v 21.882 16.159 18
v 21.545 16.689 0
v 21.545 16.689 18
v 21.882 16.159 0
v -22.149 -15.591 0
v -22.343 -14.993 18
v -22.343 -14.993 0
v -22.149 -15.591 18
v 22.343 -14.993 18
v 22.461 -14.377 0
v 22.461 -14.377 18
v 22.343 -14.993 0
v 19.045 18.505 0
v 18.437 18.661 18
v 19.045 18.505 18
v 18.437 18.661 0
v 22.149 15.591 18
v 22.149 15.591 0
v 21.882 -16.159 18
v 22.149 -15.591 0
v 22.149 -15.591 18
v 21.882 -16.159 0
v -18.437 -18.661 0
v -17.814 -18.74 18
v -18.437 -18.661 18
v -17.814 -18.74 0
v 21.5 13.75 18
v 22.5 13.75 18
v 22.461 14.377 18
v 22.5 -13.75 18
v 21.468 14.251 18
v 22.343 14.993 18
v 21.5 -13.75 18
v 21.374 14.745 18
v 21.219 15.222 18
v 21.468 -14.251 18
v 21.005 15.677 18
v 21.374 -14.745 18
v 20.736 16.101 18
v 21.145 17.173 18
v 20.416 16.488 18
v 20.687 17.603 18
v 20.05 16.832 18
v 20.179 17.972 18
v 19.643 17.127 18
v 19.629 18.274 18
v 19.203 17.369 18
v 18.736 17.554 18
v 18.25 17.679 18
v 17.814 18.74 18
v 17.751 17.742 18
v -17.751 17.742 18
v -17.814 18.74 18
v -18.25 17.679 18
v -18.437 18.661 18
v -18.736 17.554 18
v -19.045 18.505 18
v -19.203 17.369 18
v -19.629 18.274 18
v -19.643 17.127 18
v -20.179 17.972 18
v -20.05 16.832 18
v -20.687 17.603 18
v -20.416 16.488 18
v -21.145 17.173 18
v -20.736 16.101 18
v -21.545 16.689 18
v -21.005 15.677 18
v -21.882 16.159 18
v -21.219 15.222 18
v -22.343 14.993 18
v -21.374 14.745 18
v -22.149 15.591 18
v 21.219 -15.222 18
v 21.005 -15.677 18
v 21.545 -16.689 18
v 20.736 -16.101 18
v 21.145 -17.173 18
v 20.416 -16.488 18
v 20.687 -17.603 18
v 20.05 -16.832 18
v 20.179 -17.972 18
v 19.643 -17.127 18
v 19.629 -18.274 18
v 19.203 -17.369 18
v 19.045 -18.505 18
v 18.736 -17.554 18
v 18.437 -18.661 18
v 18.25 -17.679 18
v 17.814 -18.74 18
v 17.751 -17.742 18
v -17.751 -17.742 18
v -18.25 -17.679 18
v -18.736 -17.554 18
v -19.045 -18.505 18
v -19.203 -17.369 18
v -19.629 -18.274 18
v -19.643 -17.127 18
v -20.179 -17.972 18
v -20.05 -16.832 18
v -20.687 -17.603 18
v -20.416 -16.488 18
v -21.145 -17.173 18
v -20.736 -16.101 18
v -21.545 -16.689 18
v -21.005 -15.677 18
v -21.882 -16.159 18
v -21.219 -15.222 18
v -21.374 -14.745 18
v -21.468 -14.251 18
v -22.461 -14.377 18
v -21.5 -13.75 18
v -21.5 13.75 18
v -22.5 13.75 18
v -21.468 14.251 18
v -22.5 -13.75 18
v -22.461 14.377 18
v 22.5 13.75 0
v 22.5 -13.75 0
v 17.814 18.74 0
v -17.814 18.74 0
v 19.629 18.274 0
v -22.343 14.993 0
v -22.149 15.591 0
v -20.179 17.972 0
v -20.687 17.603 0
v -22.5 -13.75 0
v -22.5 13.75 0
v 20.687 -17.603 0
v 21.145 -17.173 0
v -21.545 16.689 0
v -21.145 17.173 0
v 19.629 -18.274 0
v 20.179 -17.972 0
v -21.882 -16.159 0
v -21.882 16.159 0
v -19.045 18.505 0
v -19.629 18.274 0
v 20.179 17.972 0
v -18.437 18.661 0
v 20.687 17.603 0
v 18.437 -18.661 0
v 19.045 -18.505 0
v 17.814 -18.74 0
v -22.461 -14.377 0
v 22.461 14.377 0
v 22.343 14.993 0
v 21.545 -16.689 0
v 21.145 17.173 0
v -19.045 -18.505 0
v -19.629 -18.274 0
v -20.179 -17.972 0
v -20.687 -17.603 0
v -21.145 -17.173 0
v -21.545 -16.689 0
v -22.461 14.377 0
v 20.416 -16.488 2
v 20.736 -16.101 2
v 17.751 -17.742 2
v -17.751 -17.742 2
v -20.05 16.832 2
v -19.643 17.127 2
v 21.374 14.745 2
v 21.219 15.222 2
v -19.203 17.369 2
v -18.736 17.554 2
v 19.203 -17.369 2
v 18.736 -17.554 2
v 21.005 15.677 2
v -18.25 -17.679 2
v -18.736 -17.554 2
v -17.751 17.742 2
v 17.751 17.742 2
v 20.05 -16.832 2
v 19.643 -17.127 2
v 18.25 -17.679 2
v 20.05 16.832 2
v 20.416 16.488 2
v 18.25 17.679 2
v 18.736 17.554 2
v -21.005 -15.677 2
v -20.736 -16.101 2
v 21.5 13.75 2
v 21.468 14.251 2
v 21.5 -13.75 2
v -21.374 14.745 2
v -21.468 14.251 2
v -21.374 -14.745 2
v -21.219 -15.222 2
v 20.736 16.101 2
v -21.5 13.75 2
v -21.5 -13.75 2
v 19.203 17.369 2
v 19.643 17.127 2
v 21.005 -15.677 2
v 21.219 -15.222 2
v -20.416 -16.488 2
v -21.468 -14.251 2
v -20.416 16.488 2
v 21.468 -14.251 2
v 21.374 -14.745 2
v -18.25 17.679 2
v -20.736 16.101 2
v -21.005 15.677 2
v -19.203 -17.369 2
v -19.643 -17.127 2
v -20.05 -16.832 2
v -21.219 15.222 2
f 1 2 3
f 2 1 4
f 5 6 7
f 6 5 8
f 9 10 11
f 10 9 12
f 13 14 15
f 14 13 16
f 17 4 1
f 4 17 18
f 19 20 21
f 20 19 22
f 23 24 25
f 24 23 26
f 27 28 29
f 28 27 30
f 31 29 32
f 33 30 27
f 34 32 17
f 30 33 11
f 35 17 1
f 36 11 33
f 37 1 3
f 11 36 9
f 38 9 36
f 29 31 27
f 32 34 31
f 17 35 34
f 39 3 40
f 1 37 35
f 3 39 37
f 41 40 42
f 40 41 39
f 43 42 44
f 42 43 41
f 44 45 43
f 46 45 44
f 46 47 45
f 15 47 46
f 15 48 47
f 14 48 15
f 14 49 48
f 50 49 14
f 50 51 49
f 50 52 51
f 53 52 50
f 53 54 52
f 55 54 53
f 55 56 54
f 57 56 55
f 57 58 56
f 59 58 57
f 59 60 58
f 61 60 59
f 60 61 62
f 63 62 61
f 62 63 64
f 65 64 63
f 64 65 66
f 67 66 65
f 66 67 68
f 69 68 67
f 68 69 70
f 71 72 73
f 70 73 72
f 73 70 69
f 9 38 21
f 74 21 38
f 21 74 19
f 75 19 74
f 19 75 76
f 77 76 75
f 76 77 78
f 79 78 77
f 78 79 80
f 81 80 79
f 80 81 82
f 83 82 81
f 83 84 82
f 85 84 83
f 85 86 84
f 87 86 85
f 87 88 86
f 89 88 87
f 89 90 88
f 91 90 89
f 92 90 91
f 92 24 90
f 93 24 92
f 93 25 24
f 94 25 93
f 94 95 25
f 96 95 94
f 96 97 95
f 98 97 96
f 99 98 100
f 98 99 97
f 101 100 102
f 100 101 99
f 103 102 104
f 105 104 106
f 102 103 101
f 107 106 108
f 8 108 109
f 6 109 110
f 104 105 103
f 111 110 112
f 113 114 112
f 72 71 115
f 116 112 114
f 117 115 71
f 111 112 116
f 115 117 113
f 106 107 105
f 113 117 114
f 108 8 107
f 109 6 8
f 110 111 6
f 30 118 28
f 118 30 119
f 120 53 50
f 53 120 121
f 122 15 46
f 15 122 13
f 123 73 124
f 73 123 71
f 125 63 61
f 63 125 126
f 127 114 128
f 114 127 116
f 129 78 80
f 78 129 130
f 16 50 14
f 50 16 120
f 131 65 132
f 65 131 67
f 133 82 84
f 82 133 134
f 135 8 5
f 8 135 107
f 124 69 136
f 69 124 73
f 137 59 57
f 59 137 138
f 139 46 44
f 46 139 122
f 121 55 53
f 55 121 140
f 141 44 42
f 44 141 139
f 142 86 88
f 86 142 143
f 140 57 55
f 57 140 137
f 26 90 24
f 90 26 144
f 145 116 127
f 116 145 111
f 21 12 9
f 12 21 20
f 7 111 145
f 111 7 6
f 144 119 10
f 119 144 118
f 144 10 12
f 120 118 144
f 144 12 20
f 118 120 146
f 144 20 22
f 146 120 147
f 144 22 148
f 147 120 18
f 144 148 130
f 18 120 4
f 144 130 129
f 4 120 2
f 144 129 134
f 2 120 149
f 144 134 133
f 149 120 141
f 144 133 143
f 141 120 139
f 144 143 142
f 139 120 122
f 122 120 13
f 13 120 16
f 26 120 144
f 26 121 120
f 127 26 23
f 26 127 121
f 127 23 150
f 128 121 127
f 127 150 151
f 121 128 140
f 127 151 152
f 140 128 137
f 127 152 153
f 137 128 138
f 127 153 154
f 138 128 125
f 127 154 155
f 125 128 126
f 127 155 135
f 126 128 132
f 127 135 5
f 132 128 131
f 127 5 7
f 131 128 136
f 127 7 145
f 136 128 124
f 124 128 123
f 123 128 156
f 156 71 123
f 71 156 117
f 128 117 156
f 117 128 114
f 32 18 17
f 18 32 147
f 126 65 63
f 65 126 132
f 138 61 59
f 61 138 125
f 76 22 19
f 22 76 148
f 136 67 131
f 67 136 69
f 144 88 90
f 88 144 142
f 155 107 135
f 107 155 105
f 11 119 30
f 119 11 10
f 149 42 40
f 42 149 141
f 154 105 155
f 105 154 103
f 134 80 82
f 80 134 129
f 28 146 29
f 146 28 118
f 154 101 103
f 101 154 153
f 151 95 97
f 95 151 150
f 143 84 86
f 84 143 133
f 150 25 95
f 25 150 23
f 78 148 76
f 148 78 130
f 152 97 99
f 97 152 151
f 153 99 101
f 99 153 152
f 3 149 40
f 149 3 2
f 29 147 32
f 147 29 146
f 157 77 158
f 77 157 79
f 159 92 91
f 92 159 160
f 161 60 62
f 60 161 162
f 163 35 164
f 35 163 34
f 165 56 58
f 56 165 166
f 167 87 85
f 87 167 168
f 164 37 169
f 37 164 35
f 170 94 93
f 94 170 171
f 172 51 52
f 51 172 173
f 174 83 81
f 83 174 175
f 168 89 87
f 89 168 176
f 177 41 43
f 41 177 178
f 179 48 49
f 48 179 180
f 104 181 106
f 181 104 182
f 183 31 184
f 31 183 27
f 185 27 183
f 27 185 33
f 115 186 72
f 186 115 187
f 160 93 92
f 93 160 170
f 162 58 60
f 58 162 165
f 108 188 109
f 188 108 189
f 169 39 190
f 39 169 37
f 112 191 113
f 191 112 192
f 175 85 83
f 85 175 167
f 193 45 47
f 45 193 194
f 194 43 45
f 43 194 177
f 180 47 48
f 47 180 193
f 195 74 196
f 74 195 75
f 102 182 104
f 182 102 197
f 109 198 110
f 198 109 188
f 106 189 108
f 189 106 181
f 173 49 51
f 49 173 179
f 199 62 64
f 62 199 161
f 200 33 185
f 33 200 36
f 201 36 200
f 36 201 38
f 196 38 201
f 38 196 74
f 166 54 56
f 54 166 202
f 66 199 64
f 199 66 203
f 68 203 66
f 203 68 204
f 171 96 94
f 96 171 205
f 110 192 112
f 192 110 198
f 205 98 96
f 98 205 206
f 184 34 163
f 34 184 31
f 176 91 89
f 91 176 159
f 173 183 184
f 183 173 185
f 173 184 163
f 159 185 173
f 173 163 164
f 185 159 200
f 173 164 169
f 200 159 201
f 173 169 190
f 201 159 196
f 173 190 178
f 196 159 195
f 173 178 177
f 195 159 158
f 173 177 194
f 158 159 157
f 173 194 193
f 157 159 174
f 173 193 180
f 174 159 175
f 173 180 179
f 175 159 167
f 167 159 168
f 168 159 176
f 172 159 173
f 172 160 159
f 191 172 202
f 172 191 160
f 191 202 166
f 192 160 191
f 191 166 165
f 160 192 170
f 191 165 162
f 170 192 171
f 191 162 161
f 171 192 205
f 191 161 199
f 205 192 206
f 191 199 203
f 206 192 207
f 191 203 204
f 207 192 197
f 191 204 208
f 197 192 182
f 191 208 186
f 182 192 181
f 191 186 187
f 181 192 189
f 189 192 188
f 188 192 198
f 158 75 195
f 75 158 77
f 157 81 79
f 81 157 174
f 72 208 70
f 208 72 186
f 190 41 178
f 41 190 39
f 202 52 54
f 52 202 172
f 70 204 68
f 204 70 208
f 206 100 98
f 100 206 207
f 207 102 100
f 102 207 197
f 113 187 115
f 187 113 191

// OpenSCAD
$fn = 50;


difference() {
	union() {
		hull() {
			translate(v = [-17.5000000000, 13.7500000000, 0]) {
				cylinder(h = 18, r = 5);
			}
			translate(v = [17.5000000000, 13.7500000000, 0]) {
				cylinder(h = 18, r = 5);
			}
			translate(v = [-17.5000000000, -13.7500000000, 0]) {
				cylinder(h = 18, r = 5);
			}
			translate(v = [17.5000000000, -13.7500000000, 0]) {
				cylinder(h = 18, r = 5);
			}
		}
	}
	union() {
		translate(v = [0, 0, 2]) {
			#hull() {
				translate(v = [-17.5000000000, 13.7500000000, 0]) {
					cylinder(h = 16, r = 4);
				}
				translate(v = [17.5000000000, 13.7500000000, 0]) {
					cylinder(h = 16, r = 4);
				}
				translate(v = [-17.5000000000, -13.7500000000, 0]) {
					cylinder(h = 16, r = 4);
				}
				translate(v = [17.5000000000, -13.7500000000, 0]) {
					cylinder(h = 16, r = 4);
				}
			}
		}
	}
}
